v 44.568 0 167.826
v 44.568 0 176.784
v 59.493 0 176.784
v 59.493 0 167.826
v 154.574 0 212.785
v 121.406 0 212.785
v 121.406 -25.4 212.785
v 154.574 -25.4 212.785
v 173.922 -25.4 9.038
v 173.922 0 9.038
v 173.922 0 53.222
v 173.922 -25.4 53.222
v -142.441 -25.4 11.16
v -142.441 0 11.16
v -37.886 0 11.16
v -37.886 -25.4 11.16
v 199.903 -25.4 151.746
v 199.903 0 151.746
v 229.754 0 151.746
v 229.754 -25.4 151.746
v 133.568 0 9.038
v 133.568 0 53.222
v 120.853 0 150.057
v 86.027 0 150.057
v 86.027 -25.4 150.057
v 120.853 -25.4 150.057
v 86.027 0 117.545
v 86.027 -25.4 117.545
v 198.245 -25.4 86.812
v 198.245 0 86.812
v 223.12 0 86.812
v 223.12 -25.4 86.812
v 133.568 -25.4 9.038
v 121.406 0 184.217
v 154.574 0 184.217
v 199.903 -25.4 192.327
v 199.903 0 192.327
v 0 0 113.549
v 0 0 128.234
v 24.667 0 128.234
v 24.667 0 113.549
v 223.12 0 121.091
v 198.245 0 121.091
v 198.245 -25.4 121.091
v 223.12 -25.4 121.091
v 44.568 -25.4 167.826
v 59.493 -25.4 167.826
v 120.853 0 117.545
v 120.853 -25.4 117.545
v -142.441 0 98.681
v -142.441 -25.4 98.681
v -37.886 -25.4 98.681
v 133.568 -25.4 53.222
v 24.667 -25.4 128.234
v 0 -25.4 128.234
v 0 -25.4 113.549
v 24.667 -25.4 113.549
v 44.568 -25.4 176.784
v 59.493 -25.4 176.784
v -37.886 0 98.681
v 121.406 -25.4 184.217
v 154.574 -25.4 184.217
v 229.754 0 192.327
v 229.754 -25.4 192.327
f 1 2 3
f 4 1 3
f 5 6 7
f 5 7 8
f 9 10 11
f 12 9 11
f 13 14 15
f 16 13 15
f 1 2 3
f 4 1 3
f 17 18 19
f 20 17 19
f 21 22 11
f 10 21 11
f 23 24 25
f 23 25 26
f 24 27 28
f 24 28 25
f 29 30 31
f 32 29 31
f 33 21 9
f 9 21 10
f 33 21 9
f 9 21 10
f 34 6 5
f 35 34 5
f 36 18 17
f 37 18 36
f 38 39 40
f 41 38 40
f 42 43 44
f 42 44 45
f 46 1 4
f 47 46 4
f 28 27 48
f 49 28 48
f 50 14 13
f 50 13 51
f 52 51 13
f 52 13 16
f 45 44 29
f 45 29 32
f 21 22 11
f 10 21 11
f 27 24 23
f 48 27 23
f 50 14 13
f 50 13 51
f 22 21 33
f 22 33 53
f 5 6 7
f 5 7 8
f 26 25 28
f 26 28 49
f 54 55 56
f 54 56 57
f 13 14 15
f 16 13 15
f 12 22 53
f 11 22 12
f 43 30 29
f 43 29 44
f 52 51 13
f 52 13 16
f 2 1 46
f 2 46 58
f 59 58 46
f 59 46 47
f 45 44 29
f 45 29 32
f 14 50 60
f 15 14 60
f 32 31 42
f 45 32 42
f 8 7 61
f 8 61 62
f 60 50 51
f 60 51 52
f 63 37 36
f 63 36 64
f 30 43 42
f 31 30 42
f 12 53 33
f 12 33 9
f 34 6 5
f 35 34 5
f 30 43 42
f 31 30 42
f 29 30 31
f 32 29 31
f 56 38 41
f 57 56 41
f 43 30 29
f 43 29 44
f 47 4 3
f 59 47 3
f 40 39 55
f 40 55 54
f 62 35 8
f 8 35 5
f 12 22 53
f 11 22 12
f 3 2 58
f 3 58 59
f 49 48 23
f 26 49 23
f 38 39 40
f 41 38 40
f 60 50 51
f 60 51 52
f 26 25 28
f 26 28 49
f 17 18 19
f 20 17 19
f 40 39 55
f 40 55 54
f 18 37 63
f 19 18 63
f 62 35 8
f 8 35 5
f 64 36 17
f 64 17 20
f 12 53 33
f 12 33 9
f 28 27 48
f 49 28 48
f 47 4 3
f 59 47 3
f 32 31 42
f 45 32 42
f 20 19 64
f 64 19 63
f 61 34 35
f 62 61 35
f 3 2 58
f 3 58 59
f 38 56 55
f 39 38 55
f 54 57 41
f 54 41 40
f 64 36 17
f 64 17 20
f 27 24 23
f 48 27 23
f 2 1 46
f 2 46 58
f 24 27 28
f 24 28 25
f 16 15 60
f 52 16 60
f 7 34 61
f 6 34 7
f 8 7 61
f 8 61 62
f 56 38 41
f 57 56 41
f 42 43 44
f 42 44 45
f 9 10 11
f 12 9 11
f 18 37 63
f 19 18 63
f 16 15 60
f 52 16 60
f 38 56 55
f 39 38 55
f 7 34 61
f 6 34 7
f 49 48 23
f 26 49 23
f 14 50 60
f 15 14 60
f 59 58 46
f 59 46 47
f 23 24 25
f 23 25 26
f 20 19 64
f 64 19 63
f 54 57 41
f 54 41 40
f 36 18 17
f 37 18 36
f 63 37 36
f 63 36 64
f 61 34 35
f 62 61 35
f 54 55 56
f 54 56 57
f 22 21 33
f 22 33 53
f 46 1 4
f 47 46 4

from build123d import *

# Parameters (mm, degrees)
F0_W     = 104.554787
F0_H     = 87.520579
F0_W_2   = 24.666995
F0_H_2   = 14.685676
F0_W_3   = 34.826107
F0_H_3   = 32.511771
F0_W_4   = 14.925468
F0_H_4   = 8.958474
F0_W_5   = 33.167705
F0_H_5   = 28.568178
F0_W_6   = 29.850945
F0_H_6   = 40.58151
F0_W_7   = 24.875745
F0_H_7   = 34.278608
F0_W_8   = 40.354044
F0_H_8   = 44.183087
F1_DEPTH = 25.4
F2_DEPTH = 25.4


with BuildPart() as f1:
    # F0 (on Front) → F1 (new body)
    with BuildSketch(Plane.XZ):
        with Locations((-90.16382, 54.920628)):
            Rectangle(F0_W, F0_H)
        with Locations((12.333498, 120.891474)):
            Rectangle(F0_W_2, F0_H_2)
        with Locations((103.440288, 133.800939)):
            Rectangle(F0_W_3, F0_H_3)
        with Locations((52.030353, 172.304906)):
            Rectangle(F0_W_4, F0_H_4)
        with Locations((137.98999, 198.501304)):
            Rectangle(F0_W_5, F0_H_5)
        with Locations((214.828513, 172.0367)):
            Rectangle(F0_W_6, F0_H_6)
        with Locations((210.682533, 103.951659)):
            Rectangle(F0_W_7, F0_H_7)
        with Locations((153.744638, 31.129998)):
            Rectangle(F0_W_8, F0_H_8)
    extrude(amount=F1_DEPTH)


with BuildPart() as f2:
    # F0 (on Front) → F2 (new body)
    with BuildSketch(Plane.XZ):
        with Locations((-90.16382, 54.920628)):
            Rectangle(F0_W, F0_H)
        with Locations((12.333498, 120.891474)):
            Rectangle(F0_W_2, F0_H_2)
        with Locations((103.440288, 133.800939)):
            Rectangle(F0_W_3, F0_H_3)
        with Locations((52.030353, 172.304906)):
            Rectangle(F0_W_4, F0_H_4)
        with Locations((137.98999, 198.501304)):
            Rectangle(F0_W_5, F0_H_5)
        with Locations((214.828513, 172.0367)):
            Rectangle(F0_W_6, F0_H_6)
        with Locations((210.682533, 103.951659)):
            Rectangle(F0_W_7, F0_H_7)
        with Locations((153.744638, 31.129998)):
            Rectangle(F0_W_8, F0_H_8)
    extrude(amount=F2_DEPTH)


solid = Compound([f1.part, f2.part])
